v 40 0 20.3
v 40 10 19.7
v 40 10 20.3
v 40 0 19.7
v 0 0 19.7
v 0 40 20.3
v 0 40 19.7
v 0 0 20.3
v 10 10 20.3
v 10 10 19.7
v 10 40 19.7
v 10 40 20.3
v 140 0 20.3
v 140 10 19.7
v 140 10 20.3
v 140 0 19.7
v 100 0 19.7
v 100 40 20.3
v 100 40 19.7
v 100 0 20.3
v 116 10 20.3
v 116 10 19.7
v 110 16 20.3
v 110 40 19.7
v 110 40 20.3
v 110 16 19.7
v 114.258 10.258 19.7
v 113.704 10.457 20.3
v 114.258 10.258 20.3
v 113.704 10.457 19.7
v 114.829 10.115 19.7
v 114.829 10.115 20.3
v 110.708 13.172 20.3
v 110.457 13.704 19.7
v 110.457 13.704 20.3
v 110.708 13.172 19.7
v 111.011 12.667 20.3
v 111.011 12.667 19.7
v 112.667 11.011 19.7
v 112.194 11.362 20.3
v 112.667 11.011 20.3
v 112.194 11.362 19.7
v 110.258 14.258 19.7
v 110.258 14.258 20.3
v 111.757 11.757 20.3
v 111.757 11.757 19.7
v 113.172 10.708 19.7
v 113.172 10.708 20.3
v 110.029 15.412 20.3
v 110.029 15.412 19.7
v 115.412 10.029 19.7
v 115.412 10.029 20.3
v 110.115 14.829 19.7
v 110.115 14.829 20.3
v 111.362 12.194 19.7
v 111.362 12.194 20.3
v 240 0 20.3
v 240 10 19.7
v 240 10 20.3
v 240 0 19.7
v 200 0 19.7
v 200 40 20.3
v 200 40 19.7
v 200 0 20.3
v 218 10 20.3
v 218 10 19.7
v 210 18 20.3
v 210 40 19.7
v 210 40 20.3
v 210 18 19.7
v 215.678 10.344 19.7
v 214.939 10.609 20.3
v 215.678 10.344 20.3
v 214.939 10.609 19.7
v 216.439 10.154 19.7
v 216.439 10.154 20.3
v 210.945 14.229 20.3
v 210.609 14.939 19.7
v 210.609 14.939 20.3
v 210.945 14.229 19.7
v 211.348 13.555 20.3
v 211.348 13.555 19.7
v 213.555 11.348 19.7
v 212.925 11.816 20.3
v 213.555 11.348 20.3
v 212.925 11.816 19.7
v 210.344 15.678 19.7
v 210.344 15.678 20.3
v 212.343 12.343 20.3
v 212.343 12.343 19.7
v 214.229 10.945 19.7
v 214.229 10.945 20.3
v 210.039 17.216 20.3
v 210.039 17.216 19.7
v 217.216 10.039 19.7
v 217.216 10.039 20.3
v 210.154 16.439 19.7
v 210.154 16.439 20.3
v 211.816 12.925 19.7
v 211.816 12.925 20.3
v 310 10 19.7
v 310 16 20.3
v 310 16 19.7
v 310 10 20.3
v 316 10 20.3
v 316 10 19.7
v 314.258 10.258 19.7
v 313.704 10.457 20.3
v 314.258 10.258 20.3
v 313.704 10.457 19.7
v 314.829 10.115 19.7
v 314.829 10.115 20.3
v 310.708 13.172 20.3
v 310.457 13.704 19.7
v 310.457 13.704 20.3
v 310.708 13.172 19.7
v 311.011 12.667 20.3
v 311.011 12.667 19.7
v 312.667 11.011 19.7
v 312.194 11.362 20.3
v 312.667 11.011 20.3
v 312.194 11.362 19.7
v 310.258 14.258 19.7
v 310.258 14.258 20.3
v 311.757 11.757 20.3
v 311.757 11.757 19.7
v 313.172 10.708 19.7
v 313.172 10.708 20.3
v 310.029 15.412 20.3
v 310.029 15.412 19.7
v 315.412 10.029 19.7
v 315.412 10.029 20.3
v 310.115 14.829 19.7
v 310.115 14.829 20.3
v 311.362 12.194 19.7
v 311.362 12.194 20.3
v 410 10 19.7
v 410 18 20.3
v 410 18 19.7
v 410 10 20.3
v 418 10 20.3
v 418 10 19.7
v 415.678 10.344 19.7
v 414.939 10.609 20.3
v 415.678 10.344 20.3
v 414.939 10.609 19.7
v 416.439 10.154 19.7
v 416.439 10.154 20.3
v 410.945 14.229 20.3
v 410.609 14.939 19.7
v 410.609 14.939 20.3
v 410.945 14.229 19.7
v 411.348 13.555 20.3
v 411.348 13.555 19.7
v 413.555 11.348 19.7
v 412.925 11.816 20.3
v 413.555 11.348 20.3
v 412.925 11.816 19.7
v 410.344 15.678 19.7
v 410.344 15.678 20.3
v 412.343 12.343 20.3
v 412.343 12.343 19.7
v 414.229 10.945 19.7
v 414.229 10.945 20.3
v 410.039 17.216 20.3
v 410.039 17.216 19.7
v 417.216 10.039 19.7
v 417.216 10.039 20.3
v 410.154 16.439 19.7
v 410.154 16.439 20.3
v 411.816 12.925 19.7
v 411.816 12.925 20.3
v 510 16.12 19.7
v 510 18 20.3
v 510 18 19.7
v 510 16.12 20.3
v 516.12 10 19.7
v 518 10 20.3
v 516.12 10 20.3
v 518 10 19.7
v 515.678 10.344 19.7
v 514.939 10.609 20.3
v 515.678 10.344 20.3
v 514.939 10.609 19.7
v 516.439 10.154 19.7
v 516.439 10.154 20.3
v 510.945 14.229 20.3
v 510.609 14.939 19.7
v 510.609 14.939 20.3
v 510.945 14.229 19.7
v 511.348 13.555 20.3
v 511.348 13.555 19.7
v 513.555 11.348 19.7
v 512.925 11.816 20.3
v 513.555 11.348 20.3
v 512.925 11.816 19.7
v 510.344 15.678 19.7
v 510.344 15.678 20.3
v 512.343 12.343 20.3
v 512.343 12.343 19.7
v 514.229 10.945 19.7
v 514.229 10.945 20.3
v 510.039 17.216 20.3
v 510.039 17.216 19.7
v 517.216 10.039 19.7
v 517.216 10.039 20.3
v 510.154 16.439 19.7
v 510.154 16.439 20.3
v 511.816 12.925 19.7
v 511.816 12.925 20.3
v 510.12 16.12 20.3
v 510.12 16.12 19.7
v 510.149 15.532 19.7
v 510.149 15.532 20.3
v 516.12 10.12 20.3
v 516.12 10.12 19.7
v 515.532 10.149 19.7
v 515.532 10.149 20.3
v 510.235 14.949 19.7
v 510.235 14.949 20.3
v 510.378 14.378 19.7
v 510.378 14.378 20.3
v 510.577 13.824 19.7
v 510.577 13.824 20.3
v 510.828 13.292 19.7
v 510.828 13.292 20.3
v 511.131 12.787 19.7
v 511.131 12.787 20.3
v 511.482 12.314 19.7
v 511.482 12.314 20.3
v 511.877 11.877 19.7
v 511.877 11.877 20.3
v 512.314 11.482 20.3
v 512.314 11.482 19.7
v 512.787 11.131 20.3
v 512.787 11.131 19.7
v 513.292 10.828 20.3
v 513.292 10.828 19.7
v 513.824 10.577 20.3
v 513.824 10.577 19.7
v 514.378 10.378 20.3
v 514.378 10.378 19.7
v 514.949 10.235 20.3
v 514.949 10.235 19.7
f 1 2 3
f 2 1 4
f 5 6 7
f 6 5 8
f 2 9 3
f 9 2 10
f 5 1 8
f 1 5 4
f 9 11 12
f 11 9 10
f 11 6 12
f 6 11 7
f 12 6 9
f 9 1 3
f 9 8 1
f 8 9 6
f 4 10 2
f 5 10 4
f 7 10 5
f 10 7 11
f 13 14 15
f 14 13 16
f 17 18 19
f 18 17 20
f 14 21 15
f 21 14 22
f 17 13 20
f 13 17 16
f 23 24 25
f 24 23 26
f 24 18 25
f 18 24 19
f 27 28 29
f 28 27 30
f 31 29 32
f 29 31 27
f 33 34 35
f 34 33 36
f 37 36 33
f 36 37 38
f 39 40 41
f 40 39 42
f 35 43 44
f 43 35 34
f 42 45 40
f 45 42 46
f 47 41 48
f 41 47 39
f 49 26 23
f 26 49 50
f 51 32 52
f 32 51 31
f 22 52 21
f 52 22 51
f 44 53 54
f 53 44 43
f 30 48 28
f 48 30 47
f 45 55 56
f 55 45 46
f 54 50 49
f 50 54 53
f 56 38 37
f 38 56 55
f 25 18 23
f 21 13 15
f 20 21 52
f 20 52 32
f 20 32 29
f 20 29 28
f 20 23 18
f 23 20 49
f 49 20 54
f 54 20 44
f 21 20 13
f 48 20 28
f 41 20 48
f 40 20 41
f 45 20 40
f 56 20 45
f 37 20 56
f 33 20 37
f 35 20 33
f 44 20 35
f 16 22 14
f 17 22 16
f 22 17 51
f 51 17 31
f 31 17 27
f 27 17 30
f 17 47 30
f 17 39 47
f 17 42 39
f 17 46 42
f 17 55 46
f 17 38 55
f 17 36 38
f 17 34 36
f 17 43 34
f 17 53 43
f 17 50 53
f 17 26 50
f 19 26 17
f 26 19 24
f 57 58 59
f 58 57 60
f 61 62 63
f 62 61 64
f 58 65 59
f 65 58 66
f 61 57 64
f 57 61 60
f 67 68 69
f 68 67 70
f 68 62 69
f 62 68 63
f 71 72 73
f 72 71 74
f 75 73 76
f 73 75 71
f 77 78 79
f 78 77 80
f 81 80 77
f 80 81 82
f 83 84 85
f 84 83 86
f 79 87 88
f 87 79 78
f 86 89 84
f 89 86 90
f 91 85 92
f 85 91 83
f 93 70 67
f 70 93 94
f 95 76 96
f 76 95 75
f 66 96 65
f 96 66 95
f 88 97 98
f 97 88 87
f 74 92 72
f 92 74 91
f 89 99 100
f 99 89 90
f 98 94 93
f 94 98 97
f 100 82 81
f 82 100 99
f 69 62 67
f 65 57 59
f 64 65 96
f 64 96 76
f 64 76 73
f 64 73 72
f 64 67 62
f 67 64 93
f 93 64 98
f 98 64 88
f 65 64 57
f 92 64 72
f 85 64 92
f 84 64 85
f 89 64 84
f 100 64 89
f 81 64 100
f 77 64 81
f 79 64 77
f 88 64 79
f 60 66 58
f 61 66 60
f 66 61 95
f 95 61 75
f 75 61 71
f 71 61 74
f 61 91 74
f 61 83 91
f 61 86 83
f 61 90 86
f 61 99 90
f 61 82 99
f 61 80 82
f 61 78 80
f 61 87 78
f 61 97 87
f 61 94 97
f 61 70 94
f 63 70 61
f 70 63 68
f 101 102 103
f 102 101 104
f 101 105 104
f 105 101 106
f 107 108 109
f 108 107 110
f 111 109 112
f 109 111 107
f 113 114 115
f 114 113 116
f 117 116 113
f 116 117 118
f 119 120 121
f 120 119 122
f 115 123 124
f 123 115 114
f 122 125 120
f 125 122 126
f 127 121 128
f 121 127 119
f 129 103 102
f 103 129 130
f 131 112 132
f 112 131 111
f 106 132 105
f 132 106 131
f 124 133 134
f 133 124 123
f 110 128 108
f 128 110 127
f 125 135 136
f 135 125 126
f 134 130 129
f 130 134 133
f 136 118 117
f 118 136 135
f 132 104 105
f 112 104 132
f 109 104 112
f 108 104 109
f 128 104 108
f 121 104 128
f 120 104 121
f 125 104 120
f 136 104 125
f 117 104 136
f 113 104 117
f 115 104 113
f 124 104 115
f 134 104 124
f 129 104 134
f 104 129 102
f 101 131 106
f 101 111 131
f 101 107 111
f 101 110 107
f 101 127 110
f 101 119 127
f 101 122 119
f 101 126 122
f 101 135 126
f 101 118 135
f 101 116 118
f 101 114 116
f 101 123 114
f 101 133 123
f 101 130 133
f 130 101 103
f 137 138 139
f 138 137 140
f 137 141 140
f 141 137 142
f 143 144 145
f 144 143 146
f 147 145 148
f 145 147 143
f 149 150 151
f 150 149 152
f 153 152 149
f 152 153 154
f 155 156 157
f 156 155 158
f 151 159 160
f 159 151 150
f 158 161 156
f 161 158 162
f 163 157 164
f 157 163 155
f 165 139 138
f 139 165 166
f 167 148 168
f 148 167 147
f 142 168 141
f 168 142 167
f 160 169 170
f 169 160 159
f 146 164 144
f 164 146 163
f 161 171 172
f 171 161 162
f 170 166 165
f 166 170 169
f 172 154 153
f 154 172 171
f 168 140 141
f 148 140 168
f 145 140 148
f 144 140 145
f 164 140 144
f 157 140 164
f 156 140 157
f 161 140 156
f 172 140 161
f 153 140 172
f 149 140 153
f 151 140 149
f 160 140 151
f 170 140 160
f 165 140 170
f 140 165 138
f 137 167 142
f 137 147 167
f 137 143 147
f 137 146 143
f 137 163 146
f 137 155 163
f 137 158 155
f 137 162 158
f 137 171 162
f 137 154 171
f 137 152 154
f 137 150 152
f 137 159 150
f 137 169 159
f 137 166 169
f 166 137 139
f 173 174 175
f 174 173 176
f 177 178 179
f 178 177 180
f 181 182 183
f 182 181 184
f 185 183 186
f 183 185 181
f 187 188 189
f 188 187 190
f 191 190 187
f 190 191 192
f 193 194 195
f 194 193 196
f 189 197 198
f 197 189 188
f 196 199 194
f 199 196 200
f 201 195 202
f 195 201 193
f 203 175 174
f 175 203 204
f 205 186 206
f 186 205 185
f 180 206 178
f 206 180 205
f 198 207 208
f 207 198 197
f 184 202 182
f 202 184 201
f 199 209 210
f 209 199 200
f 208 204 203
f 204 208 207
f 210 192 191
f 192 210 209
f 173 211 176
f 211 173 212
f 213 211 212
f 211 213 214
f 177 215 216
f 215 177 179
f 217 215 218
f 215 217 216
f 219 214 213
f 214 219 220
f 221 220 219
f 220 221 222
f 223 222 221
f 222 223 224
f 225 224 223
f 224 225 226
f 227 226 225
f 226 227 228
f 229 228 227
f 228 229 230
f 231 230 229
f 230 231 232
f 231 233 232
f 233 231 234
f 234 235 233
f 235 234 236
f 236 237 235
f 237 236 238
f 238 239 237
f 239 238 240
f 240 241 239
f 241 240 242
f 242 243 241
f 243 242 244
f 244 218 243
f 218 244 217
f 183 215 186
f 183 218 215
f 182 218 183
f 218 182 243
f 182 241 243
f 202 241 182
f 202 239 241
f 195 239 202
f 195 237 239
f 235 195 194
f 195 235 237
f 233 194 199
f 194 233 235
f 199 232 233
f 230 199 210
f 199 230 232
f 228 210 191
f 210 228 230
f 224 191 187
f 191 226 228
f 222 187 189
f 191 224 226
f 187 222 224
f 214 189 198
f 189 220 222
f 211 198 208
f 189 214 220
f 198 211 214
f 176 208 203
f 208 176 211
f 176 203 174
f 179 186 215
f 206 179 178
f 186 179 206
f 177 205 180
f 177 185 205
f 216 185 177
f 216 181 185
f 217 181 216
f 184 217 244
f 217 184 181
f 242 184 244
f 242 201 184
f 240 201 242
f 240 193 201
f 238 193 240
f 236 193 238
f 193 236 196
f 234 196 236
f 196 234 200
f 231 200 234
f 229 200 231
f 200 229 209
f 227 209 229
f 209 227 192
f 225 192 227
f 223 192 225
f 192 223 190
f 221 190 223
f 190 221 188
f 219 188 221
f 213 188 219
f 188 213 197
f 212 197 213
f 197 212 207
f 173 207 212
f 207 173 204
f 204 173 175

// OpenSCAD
// file: ../lib/_ref.scad
// -----------------------------------------------------------------------------
// Hand-written reference tools.
//
// These are the known-good answers, built from the classic OpenSCAD idioms
// (corner square - quarter cylinder, annulus prism - torus, ...). They do NOT
// use fillet_tool/round_tool/chamfer_tool/bevel_tool, so they render with a
// stock OpenSCAD and stay a genuinely independent yardstick for the operator.
//
// Sign convention, same as the operator's: a CONCAVE tool (fillet/chamfer) is
// unioned with the model, a CONVEX tool (round/bevel) is subtracted from it.
// -----------------------------------------------------------------------------

// ---- single 90-degree edge running along Z -----------------------------------

// Concave fillet bead. Faces are x = cx (material x < cx) and y = cy (material
// y < cy); the reentrant quadrant opens toward +x,+y. UNION with the model.
// Cross-section = corner square minus a quarter disc.
module ref_fillet_edge_z(cx, cy, r, h, z0 = 0) {
  translate([0, 0, z0])
    difference() {
      translate([cx, cy, 0]) cube([r, r, h]);
      translate([cx + r, cy + r, -1]) cylinder(r = r, h = h + 2);
    }
}

// Convex round tool. Convex corner at (cx,cy), material x < cx & y < cy.
// SUBTRACT from the model; it is the sharp corner sliver outside the arc.
module ref_round_edge_z(cx, cy, r, h, z0 = 0) {
  translate([0, 0, z0])
    difference() {
      translate([cx - r, cy - r, 0]) cube([r, r, h]);
      translate([cx - r, cy - r, -1]) cylinder(r = r, h = h + 2);
    }
}

// Concave chamfer bead — the wedge alone, no arc. UNION with the model.
module ref_chamfer_edge_z(cx, cy, t, h, z0 = 0) {
  translate([0, 0, z0])
    linear_extrude(h)
      polygon([[cx, cy], [cx + t, cy], [cx, cy + t]]);
}

// Convex bevel tool — the flat wedge cut off a convex corner at (cx,cy),
// material x < cx & y < cy. SUBTRACT from the model.
module ref_bevel_edge_z(cx, cy, t, h, z0 = 0) {
  translate([0, 0, z0])
    linear_extrude(h)
      polygon([[cx, cy], [cx - t, cy], [cx, cy - t]]);
}

// ---- closed ring edges around the Z axis -------------------------------------

// Convex mouth of a through hole of radius rh whose face is at z = zf, material
// below the face and outside the hole. SUBTRACT from the model.
// Annulus prism rh..rh+r over z[zf-r,zf], minus the torus at rho=rh+r, z=zf-r.
module ref_round_hole_mouth(rh, zf, r) {
  translate([0, 0, zf - r])
    difference() {
      difference() {
        cylinder(r = rh + r, h = r);
        translate([0, 0, -1]) cylinder(r = rh, h = r + 2);
      }
      rotate_extrude() translate([rh + r, 0]) circle(r = r);
    }
}

// Concave base of a boss of radius rb standing on a face at z = zf, material
// inside the boss and below the face. UNION with the model.
module ref_fillet_boss_base(rb, zf, r) {
  translate([0, 0, zf])
    difference() {
      difference() {
        cylinder(r = rb + r, h = r);
        translate([0, 0, -1]) cylinder(r = rb, h = r + 2);
      }
      rotate_extrude() translate([rb + r, r]) circle(r = r);
    }
}
// main file
// Harness self-test, negative. The "candidate" is a hand-written bead of the
// WRONG radius (8 against a reference 6), so the tool check must FAIL: the
// shapes differ by far more than the tolerance. Together with selftest_equal
// this pins the harness between always-pass and always-fail.
//
// The sandwich check still passes here, and that is the honest calibration of
// it: a bead of the wrong radius still hugs both faces, so it never strays
// further than the nominal size from the model. Sandwich catches gouges and
// runaway tools, not sizing errors — which is why cases keep a hand reference
// wherever one can be written.

include <../lib/_ref.scad>;
include <../lib/_harness.scad>;

$fn = 64;

H  = 40;
CX = 10;
CY = 10;
WRONG = 8;

CASE_SIGN  = "union";
CASE_SLICE = ["top", H / 2];
CASE_DY    = 120;
//               name    size  has_ref  tol
CASE_VARIANTS = [["small",  6,  true,   0.12]];

module case_model() {
  cube([40, CY, H]);
  cube([CX, 40, H]);
}

module case_ref_tool()  ref_fillet_edge_z(CX, CY, $case_size, H);
module case_cand_tool() ref_fillet_edge_z(CX, CY, WRONG, H);
module case_clip()      fillet_clip_all();

module case_view()
  fillet_case_view(CASE_SIGN, CASE_VARIANTS, CASE_SLICE, CASE_DY)
    { case_model(); case_ref_tool(); case_cand_tool(); case_clip(); }

if (!FILLET_DRIVER) case_view();
